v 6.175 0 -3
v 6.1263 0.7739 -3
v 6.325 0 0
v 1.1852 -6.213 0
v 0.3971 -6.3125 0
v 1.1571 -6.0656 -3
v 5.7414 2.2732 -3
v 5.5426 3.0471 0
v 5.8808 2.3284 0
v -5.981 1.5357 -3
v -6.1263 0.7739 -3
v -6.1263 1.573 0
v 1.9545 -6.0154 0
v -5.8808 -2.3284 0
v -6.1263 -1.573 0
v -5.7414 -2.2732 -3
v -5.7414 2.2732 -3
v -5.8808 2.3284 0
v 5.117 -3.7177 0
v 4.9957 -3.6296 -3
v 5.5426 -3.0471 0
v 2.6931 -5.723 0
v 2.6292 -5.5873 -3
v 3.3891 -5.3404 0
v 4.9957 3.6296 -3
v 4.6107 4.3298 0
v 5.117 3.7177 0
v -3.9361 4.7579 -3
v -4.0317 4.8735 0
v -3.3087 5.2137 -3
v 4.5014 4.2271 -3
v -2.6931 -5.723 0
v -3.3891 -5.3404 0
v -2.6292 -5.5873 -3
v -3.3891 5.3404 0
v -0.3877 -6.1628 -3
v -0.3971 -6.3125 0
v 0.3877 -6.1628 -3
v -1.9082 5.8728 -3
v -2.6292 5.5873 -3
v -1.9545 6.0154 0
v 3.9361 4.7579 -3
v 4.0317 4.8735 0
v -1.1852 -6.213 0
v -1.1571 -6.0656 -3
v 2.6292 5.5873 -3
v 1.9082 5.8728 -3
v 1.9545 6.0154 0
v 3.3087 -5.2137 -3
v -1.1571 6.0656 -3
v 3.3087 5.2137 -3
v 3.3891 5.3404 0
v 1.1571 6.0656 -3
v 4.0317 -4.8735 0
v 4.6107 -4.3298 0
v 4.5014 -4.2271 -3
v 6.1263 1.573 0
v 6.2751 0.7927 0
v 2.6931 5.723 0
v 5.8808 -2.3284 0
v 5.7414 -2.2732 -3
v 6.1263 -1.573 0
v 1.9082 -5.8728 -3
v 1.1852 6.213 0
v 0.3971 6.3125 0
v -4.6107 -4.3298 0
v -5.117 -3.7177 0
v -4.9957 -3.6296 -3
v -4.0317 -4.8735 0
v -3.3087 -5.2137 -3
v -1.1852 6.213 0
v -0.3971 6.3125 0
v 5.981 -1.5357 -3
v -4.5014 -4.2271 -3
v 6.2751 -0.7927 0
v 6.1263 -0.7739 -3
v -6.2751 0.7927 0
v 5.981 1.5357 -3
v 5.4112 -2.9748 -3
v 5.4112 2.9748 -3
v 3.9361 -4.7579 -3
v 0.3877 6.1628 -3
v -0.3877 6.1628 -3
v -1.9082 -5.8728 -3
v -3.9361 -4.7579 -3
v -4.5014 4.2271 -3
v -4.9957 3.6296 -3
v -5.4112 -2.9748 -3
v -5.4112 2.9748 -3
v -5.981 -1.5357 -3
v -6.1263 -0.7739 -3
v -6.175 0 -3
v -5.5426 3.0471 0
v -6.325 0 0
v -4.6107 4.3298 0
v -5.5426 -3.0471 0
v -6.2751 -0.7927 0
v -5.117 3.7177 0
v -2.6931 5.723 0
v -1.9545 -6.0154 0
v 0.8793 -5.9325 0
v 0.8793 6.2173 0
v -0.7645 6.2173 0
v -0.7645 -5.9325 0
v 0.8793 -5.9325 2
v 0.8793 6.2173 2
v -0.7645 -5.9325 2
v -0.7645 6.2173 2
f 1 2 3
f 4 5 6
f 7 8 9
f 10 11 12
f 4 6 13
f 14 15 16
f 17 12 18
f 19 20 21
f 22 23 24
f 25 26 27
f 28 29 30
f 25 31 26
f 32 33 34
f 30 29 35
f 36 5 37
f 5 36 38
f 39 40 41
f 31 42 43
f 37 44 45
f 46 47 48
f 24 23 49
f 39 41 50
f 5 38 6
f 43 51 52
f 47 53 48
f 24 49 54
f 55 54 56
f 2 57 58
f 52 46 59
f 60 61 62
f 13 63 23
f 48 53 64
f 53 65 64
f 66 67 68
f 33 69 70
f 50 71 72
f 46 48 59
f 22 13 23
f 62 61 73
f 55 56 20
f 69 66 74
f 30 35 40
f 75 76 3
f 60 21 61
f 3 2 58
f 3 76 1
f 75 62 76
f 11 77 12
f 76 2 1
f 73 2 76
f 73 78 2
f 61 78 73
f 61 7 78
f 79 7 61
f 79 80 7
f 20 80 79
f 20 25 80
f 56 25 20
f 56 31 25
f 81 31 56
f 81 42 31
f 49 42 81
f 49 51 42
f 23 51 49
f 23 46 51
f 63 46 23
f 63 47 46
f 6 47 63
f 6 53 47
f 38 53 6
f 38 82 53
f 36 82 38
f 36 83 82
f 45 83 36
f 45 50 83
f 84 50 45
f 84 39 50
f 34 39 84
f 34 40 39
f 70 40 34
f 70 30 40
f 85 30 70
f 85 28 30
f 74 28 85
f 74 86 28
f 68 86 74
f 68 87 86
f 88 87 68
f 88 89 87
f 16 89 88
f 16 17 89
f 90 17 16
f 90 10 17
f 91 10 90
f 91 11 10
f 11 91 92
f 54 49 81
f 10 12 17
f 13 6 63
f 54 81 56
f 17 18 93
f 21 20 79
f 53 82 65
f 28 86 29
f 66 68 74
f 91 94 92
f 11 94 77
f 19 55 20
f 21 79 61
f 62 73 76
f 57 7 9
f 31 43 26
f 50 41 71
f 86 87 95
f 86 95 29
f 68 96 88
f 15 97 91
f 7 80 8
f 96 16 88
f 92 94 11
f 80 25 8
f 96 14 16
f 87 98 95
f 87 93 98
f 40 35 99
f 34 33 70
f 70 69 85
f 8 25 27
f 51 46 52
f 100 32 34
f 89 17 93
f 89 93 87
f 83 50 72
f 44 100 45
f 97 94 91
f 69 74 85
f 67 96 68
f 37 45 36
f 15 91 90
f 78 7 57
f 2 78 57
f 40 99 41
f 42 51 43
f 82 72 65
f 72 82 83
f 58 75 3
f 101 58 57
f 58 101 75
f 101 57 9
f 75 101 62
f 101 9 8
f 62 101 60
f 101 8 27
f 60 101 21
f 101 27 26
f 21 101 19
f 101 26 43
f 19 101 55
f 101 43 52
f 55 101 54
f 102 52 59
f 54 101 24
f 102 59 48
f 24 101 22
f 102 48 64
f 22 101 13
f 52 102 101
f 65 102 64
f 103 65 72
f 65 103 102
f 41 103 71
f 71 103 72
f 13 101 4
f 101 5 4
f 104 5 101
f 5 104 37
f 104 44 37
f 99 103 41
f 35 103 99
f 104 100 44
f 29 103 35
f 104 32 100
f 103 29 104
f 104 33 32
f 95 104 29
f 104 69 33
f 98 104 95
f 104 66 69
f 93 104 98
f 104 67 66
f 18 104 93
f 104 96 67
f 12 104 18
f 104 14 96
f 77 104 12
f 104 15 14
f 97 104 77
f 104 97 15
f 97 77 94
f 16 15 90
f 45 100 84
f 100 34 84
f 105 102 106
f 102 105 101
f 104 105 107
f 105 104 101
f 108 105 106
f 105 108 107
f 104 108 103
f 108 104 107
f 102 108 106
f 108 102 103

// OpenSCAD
$fn = 50;

difference() {
	union() {
		translate(v = [0, 0, -3.0]) {
			cylinder(h = 3, r1 = 6.175, r2 = 6.325);
		}
		linear_extrude(height = 2) {
			text(font = "Impact", halign = "center", size = 12, text = "I", valign = "center");
		}
	}
	union();
}
